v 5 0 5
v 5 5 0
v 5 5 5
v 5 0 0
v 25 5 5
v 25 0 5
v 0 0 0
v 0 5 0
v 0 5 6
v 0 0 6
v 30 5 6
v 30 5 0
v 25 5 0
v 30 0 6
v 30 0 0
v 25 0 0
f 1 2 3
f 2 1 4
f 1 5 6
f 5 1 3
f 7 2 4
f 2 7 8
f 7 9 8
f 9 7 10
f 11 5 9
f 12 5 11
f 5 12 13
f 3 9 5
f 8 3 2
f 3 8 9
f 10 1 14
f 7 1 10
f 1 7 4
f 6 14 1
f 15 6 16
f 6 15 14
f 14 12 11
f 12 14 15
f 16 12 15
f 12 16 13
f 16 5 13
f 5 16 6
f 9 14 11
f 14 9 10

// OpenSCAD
cube(5);
translate([25, 0, 0])
	cube(5);
translate([0, 0, 5])
	cube([30, 5, 1]);
